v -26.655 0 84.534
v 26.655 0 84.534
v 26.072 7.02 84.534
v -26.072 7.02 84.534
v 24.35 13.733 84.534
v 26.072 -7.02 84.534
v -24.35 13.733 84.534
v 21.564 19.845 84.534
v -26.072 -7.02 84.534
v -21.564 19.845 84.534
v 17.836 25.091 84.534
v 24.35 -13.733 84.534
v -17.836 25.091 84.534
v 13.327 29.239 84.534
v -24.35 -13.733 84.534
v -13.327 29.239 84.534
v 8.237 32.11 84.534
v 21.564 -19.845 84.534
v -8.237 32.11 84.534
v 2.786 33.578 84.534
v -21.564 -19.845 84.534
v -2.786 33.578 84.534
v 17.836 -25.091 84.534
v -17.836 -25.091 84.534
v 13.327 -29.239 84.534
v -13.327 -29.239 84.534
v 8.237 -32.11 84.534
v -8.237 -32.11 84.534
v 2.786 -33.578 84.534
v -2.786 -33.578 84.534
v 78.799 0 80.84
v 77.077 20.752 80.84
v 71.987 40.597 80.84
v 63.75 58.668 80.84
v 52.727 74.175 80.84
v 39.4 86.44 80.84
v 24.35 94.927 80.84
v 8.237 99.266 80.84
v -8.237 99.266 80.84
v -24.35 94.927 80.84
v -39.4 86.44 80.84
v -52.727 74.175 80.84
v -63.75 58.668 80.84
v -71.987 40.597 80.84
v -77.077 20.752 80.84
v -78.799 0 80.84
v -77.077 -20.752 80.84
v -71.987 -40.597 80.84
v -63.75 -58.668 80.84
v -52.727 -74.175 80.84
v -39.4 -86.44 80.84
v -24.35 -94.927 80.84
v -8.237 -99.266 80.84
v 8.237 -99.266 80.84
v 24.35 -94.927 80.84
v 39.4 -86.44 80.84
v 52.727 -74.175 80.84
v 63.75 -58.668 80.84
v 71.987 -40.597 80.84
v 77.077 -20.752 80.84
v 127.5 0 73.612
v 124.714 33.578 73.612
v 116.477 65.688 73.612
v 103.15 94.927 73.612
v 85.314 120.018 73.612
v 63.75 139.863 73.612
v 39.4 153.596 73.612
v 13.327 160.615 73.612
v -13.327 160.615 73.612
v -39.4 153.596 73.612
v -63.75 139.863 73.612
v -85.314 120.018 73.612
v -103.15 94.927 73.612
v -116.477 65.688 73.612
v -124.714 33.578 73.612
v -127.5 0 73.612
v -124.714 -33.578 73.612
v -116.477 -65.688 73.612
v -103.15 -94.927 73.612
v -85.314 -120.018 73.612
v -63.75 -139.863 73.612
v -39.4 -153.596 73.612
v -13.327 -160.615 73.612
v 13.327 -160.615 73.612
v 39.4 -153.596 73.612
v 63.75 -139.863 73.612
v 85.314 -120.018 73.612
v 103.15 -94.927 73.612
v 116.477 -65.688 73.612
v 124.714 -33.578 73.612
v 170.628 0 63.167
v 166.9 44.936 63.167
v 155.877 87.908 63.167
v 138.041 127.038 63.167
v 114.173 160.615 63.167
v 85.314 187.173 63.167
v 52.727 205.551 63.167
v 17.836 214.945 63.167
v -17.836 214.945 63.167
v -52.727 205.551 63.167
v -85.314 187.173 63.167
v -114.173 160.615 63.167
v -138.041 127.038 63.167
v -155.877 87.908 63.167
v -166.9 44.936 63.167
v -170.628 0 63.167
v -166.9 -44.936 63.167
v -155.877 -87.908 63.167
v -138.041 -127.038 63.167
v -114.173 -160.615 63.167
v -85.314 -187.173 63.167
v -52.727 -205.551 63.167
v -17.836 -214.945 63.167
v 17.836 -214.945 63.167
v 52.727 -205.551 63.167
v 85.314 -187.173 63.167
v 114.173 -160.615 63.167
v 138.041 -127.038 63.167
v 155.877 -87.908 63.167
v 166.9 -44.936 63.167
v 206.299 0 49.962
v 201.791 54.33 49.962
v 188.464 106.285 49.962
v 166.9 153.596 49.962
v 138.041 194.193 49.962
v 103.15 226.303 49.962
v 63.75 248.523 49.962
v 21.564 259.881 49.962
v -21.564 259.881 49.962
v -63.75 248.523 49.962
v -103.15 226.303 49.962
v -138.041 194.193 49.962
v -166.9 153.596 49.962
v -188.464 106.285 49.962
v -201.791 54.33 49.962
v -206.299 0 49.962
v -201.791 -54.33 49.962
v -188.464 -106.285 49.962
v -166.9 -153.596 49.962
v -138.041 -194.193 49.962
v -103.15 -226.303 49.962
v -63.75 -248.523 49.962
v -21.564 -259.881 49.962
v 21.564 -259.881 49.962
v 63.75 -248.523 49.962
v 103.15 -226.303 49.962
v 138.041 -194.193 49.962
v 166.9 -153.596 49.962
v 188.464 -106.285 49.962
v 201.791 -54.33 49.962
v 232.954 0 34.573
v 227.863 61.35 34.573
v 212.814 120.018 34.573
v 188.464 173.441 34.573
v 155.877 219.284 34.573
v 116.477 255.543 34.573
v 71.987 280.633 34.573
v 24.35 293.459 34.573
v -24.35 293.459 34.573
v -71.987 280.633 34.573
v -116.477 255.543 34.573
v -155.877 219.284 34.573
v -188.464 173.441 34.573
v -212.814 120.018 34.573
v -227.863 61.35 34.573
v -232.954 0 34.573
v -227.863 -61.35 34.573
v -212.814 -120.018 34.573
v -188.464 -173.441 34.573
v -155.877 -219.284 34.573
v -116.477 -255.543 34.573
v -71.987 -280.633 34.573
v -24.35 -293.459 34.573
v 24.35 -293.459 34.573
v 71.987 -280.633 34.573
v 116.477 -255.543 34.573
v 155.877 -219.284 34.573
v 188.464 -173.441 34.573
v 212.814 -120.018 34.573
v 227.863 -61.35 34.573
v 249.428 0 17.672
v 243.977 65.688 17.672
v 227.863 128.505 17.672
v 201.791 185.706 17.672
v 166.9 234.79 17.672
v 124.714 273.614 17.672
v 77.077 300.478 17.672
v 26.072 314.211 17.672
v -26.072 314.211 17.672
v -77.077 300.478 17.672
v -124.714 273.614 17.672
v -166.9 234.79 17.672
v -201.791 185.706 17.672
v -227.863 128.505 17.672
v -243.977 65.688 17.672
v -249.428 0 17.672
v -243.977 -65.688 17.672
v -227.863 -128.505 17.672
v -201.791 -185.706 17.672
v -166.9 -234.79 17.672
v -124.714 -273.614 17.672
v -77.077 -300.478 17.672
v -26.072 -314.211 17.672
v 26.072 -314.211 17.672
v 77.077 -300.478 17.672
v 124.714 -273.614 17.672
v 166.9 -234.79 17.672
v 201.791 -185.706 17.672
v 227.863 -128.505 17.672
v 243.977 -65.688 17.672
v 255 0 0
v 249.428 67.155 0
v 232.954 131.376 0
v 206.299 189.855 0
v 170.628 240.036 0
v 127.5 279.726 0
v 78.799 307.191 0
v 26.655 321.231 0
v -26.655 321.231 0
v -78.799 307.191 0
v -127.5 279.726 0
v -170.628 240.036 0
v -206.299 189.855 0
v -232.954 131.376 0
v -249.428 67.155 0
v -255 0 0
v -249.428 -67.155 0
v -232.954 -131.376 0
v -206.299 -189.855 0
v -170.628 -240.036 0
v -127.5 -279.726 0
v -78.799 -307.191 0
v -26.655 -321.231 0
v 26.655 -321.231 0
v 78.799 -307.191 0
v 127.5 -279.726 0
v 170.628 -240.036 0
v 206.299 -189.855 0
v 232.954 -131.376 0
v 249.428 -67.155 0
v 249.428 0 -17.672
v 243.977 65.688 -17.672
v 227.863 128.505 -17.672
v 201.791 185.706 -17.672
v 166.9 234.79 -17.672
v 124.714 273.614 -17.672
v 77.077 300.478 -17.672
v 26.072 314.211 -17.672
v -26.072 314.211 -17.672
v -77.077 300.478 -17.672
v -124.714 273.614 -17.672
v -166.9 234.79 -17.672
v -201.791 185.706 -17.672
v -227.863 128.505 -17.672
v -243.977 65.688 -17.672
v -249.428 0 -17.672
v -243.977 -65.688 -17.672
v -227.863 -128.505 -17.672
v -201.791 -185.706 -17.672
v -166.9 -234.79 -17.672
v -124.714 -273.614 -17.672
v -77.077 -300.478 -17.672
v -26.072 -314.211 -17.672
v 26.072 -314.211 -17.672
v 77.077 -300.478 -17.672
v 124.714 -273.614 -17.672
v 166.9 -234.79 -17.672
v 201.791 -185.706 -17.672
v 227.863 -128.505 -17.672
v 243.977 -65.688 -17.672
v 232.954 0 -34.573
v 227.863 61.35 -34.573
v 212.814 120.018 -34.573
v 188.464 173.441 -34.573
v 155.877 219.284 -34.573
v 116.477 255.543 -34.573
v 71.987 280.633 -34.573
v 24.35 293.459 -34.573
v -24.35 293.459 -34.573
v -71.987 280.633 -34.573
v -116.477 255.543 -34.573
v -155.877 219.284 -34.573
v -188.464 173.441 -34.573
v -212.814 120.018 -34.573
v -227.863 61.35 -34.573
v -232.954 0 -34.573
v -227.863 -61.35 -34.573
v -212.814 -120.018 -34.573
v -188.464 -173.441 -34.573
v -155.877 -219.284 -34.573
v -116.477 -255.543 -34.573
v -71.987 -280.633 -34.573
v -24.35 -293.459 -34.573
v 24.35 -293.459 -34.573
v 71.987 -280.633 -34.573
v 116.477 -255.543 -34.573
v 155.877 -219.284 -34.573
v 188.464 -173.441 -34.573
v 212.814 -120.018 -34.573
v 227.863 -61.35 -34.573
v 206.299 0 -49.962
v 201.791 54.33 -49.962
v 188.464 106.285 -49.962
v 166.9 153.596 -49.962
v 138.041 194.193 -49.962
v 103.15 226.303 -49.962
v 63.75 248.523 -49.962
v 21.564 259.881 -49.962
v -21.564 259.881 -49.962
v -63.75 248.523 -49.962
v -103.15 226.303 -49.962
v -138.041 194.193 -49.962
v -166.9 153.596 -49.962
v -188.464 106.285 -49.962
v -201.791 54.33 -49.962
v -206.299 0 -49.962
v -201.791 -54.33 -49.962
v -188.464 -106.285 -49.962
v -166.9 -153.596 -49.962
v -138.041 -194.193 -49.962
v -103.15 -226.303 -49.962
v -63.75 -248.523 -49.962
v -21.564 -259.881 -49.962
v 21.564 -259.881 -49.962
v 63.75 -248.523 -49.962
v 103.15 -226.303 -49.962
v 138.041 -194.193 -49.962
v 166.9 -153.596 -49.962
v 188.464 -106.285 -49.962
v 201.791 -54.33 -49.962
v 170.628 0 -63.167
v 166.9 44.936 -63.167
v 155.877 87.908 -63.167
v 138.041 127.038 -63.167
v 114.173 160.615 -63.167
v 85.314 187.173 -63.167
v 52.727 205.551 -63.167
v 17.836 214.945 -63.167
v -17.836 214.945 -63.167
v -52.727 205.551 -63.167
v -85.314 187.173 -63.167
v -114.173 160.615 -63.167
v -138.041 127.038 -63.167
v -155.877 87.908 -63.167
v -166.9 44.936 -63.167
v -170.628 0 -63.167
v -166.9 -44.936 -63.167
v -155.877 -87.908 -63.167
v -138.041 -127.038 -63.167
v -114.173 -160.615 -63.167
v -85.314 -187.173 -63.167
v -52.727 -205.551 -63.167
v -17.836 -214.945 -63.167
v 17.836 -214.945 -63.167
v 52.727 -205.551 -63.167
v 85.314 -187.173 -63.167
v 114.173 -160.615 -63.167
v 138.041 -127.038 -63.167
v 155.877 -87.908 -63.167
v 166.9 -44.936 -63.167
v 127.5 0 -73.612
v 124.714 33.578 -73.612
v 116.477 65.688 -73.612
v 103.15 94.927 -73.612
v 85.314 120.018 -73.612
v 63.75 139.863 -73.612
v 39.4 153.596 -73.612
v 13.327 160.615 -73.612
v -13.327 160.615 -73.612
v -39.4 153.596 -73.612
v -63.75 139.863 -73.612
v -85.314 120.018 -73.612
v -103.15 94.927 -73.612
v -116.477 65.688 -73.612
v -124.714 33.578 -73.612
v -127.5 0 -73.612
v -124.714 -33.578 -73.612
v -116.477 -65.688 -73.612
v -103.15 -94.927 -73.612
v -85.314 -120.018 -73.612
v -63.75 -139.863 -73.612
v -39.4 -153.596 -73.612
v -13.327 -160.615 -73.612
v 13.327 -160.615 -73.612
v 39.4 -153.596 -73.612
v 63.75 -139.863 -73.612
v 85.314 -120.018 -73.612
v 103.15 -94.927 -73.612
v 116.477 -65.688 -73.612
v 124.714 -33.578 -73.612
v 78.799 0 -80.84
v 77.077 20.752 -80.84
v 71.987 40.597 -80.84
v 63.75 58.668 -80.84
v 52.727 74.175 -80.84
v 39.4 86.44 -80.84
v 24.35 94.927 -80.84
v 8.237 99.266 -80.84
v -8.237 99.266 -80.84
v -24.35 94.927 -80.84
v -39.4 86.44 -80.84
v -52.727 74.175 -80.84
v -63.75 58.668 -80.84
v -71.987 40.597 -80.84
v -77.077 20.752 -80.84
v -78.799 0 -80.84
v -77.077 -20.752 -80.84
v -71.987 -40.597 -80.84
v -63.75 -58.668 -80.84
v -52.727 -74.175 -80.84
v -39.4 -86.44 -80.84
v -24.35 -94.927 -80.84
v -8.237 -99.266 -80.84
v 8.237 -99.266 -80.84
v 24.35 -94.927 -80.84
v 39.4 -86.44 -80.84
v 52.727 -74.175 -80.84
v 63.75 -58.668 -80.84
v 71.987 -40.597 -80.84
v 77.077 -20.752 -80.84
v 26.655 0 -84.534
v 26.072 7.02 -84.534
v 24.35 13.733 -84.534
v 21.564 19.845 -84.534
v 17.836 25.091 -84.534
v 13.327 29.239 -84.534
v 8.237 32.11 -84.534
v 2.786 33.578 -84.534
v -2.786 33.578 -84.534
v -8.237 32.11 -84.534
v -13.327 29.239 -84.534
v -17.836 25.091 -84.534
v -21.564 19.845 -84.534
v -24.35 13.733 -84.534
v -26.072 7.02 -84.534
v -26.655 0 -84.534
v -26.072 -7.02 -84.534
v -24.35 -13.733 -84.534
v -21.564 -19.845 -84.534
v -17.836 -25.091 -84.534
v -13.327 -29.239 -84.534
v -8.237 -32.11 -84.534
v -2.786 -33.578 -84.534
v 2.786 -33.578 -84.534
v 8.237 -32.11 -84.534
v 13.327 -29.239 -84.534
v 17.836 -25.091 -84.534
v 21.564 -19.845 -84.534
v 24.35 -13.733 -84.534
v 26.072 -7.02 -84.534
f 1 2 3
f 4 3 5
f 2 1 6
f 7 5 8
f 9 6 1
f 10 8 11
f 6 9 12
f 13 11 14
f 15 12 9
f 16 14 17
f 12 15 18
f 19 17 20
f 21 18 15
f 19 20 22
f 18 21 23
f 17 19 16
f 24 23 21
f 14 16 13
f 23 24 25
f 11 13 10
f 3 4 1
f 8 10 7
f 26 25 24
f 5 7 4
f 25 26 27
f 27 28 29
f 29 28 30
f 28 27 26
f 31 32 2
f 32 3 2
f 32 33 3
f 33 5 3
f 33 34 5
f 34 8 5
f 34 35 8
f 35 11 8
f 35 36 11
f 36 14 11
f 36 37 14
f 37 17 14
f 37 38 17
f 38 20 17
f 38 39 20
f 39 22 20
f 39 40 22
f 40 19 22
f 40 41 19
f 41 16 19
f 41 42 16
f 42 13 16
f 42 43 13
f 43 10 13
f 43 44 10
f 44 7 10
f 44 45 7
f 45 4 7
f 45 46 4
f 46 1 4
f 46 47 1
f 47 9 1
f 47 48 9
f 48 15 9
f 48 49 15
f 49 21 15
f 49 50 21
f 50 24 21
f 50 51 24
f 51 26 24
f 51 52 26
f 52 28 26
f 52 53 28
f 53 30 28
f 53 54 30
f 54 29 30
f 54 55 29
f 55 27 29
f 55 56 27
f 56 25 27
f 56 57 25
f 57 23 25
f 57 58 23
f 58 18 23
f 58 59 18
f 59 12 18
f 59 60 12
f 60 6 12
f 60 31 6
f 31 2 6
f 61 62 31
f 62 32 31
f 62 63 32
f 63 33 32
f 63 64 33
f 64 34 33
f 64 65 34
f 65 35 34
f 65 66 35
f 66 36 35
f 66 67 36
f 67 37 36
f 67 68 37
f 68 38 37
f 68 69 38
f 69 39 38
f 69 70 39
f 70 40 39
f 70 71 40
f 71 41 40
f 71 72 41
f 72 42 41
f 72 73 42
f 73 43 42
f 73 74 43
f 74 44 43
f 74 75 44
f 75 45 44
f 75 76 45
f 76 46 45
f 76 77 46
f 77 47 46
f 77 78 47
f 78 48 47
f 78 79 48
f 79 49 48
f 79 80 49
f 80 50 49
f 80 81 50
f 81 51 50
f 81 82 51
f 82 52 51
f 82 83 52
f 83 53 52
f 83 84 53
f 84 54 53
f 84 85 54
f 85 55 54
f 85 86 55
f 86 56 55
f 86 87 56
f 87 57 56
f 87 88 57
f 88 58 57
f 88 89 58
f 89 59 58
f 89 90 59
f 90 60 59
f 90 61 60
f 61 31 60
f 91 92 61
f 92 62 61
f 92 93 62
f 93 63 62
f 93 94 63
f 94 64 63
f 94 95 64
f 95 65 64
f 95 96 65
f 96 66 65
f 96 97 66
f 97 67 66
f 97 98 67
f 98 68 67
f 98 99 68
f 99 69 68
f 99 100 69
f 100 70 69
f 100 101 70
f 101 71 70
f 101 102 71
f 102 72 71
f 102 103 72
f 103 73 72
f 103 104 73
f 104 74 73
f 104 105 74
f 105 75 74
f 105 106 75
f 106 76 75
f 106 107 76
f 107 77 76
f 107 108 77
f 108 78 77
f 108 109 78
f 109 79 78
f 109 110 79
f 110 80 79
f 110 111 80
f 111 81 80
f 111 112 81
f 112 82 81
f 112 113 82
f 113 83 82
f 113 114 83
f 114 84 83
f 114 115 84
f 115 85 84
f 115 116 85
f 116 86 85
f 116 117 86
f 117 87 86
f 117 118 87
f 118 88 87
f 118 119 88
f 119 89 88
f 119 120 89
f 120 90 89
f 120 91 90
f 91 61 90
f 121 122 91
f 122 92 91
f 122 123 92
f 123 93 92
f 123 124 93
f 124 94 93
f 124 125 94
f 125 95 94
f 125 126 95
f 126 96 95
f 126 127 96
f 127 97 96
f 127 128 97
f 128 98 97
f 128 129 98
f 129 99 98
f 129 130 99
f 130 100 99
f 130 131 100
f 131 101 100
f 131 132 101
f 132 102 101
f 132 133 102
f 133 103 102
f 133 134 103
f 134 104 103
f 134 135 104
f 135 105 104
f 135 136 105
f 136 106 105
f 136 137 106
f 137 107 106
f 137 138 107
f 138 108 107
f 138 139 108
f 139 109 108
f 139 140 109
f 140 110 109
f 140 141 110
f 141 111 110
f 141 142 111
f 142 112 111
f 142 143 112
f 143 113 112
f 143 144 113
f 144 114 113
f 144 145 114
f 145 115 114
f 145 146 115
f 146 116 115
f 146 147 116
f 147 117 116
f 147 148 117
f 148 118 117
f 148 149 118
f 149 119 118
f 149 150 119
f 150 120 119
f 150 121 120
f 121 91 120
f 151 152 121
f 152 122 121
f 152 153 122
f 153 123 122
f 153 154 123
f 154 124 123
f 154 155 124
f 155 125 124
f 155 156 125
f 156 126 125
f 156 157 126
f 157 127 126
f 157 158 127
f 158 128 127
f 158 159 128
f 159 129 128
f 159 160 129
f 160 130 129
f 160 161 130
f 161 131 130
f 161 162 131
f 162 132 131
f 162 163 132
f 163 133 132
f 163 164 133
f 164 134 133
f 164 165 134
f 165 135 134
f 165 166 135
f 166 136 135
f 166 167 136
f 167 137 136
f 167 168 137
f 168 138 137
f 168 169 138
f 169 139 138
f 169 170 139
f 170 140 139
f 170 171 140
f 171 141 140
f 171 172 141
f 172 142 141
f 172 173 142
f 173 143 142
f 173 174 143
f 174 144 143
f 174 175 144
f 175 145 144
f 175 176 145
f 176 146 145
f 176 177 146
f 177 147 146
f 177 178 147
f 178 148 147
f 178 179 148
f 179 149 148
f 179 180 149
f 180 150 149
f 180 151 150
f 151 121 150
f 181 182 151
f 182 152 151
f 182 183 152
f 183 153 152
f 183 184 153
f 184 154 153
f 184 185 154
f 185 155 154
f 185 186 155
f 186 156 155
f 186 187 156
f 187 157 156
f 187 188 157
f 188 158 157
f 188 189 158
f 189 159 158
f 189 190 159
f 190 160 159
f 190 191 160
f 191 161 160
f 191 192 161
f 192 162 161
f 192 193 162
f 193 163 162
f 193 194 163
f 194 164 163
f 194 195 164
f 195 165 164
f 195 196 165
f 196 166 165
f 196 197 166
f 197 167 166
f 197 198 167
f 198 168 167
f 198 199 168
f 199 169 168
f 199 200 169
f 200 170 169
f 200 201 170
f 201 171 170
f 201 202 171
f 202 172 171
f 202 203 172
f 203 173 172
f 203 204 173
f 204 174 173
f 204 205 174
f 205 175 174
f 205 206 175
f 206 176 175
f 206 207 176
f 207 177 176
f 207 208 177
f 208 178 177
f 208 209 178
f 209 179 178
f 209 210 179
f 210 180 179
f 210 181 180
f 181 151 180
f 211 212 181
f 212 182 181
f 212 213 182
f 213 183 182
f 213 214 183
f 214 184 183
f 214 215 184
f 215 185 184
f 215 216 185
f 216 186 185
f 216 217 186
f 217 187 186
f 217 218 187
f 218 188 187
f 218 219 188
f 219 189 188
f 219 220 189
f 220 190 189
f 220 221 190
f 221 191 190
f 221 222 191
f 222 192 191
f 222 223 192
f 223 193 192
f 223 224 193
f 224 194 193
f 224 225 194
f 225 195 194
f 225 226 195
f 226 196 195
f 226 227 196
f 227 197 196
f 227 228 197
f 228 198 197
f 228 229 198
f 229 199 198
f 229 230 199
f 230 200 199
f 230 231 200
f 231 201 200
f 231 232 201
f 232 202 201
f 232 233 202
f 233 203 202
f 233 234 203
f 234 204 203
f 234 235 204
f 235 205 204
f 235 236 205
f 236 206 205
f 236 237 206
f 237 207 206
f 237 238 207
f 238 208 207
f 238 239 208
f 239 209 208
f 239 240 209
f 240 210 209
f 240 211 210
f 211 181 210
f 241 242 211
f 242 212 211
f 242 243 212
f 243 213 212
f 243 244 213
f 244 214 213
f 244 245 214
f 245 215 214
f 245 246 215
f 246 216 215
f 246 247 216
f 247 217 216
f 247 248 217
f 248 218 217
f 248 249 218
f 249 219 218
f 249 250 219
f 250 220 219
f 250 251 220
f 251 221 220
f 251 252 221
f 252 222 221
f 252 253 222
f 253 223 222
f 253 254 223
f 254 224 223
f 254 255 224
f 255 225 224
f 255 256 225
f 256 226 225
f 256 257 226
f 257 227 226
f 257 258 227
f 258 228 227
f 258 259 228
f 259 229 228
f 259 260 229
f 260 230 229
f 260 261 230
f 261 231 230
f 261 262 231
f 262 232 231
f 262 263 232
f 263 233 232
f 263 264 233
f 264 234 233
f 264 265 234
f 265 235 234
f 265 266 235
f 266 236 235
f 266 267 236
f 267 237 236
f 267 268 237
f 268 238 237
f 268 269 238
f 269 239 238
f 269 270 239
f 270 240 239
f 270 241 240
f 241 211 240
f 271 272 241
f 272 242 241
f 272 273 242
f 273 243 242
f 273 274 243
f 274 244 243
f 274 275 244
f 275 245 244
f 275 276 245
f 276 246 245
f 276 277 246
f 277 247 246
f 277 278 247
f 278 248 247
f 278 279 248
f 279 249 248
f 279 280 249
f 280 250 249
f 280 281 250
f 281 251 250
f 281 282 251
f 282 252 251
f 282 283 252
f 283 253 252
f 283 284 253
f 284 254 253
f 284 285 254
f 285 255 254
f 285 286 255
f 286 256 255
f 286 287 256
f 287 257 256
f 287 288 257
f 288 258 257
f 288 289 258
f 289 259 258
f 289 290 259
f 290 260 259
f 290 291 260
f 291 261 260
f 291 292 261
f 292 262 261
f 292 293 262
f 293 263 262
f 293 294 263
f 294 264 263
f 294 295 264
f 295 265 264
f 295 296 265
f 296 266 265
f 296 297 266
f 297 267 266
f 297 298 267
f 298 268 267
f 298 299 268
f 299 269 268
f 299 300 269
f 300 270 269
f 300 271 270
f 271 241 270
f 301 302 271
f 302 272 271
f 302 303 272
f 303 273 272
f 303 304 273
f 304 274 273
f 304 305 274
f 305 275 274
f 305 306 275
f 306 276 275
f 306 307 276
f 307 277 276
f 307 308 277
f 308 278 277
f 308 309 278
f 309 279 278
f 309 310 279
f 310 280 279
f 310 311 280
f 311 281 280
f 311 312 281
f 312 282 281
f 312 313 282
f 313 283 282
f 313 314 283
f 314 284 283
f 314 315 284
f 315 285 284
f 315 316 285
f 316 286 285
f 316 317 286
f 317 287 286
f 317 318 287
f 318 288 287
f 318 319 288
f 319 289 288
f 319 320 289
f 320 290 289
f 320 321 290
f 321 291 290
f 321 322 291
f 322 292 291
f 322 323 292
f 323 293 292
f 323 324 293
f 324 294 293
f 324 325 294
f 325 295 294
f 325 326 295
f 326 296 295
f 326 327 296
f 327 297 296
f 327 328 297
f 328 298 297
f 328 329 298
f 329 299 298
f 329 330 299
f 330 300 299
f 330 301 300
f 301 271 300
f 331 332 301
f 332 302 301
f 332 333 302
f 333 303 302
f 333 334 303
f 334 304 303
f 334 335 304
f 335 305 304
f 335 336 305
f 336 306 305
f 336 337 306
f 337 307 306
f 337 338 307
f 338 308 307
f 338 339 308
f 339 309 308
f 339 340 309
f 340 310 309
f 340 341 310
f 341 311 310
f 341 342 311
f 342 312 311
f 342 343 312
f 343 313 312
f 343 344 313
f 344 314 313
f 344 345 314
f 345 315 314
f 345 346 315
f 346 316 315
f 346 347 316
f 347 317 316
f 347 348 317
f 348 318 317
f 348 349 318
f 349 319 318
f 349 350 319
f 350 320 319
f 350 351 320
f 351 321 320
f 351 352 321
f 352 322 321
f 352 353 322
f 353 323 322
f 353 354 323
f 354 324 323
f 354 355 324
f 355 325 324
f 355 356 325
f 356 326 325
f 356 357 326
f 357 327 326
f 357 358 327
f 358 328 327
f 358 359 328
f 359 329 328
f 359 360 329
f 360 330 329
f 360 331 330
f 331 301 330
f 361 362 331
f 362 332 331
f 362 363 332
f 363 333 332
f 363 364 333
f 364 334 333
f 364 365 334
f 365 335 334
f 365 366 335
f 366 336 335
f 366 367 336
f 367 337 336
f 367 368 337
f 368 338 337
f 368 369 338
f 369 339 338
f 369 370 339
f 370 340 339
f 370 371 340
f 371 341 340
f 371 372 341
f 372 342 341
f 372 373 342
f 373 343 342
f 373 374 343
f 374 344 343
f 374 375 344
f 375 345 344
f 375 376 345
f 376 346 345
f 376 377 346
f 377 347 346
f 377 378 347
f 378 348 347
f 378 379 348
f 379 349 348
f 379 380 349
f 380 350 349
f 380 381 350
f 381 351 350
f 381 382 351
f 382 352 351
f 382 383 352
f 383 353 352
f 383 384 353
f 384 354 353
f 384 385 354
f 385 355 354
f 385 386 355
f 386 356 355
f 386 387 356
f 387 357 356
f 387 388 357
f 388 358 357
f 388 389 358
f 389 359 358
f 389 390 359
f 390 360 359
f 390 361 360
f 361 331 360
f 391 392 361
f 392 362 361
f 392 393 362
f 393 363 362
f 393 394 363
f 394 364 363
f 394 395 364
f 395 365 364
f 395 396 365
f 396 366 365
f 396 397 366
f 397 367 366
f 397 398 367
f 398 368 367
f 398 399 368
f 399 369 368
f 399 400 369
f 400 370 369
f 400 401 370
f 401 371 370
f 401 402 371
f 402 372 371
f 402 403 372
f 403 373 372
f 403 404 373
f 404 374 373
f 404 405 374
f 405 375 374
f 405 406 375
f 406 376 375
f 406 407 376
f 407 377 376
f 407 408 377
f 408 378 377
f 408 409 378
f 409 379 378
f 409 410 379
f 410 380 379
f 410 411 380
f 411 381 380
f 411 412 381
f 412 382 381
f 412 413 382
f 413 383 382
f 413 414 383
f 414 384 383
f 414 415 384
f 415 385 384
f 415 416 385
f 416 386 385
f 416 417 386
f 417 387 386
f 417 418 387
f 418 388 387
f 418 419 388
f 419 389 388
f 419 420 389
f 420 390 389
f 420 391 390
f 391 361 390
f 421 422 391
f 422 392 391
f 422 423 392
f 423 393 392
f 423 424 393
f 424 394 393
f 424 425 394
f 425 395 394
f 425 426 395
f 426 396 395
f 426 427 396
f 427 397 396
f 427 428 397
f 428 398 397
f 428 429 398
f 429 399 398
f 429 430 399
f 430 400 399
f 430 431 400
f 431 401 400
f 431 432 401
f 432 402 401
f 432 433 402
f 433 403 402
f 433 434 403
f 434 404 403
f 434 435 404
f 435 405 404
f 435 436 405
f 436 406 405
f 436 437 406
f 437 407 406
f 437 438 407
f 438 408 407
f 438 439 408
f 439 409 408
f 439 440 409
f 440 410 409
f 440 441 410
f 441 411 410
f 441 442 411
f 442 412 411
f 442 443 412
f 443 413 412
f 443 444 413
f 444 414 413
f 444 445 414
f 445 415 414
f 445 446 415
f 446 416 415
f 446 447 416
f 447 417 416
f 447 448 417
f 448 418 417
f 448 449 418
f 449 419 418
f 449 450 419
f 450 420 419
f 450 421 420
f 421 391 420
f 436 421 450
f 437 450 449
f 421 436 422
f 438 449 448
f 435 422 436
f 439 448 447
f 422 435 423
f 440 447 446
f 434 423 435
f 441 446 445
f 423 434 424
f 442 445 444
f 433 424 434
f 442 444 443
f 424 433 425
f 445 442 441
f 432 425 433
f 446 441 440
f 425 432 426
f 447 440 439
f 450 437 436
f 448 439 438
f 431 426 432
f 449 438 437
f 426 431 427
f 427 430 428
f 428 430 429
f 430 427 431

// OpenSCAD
// Generated by SolidPython 1.0.1 on 2020-07-29 00:46:52


scale(v = [15, 19, 5]) {
	sphere(r = 17);
}
/***********************************************
*********      SolidPython code:      **********
************************************************
 
# import packages: SolidPython
from solid import *
from solid.utils import *
from itertools import chain, combinations, permutations


class Resize:

    def __init__(self, scad_file):
        self.scad_file = scad_file
        #self.scad_file = import_scad(scad_file)
        # cone/cylinder param:
        self.r1 = 0
        self.r2 = 0
        self.h = 0
        # rectangular prism param:
        self.w = 0
        self.l = 0
        # ellipse param:
        self.r = 0

    # import OpenScad code (file name corresponds to shape)


    # classify shape + parameters
    def assign(self, param1, param2, param3):
        if self.scad_file == 'cone.scad':
            self.r1 = param1
            self.r2 = param2
            self.h = param3
        elif self.scad_file == 'cylinder.scad':
            self.r1 = param1
            self.r2 = param2
            self.h = param3
        elif self.scad_file == 'rectangularPrism.scad':
            self.h = param1
            self.l = param2
            self.w = param3
        else:
            self.r = param1
            self.h = param2

    # resize parameters
    def iterate(self):
        x = range(3, 20, 2)
        i = 1
        if self.scad_file == 'cone.scad':
            tempList = list(permutations(x, 2))
            for temp in tempList:
                param1 = temp[0]
                param2 = temp[1]
                filepath = 'produced_scad_files/' + 'cone' + str(param1) + '_' + str(param2) + '_' + '.scad'
                scad_render_to_file(cylinder(h=param1, r1=param2, r2=0), filepath)

        elif self.scad_file == 'cylinder.scad':
            tempList = list(permutations(x, 3))
            for temp in tempList:
                param1 = temp[0]
                param2 = temp[1]
                filepath = 'produced_scad_files/' + 'cylinder' + str(param1) + '_' + str(param2) + '_' + '.scad'
                scad_render_to_file(cylinder(h=param1, r1=param2, r2=param2), filepath)

        elif self.scad_file == 'rectangularPrism.scad':
            tempList = list(permutations(x, 3))
            for temp in tempList:
                param1 = temp[0]
                param2 = temp[1]
                param3 = temp[2]
                filepath = 'produced_scad_files/' + 'rectangularPrism' + str(param1) + '_' + str(param2) + '_' + str(
                    param3) + '.scad'
                scad_render_to_file(cube(size=(param1, param2, param3)), filepath)

        elif self.scad_file == 'ellipse.scad':
            tempList = list(permutations(x, 4))
            for temp in tempList:
                param1 = temp[0]
                param2 = temp[1]
                param3 = temp[2]
                param4 = temp[3]
                filepath = 'produced_scad_files/' + 'ellipse' + str(param1) + '_' + str(param2) + '_' + str(param3) + '_' + str(param4) + '.scad'
                scad_render_to_file(scale([param1, param2, param3])(sphere(r=param4)), filepath)

    def render_to_scadfile(self):
        scad_render_to_file(scad, 'example.scad') 
 
************************************************/
